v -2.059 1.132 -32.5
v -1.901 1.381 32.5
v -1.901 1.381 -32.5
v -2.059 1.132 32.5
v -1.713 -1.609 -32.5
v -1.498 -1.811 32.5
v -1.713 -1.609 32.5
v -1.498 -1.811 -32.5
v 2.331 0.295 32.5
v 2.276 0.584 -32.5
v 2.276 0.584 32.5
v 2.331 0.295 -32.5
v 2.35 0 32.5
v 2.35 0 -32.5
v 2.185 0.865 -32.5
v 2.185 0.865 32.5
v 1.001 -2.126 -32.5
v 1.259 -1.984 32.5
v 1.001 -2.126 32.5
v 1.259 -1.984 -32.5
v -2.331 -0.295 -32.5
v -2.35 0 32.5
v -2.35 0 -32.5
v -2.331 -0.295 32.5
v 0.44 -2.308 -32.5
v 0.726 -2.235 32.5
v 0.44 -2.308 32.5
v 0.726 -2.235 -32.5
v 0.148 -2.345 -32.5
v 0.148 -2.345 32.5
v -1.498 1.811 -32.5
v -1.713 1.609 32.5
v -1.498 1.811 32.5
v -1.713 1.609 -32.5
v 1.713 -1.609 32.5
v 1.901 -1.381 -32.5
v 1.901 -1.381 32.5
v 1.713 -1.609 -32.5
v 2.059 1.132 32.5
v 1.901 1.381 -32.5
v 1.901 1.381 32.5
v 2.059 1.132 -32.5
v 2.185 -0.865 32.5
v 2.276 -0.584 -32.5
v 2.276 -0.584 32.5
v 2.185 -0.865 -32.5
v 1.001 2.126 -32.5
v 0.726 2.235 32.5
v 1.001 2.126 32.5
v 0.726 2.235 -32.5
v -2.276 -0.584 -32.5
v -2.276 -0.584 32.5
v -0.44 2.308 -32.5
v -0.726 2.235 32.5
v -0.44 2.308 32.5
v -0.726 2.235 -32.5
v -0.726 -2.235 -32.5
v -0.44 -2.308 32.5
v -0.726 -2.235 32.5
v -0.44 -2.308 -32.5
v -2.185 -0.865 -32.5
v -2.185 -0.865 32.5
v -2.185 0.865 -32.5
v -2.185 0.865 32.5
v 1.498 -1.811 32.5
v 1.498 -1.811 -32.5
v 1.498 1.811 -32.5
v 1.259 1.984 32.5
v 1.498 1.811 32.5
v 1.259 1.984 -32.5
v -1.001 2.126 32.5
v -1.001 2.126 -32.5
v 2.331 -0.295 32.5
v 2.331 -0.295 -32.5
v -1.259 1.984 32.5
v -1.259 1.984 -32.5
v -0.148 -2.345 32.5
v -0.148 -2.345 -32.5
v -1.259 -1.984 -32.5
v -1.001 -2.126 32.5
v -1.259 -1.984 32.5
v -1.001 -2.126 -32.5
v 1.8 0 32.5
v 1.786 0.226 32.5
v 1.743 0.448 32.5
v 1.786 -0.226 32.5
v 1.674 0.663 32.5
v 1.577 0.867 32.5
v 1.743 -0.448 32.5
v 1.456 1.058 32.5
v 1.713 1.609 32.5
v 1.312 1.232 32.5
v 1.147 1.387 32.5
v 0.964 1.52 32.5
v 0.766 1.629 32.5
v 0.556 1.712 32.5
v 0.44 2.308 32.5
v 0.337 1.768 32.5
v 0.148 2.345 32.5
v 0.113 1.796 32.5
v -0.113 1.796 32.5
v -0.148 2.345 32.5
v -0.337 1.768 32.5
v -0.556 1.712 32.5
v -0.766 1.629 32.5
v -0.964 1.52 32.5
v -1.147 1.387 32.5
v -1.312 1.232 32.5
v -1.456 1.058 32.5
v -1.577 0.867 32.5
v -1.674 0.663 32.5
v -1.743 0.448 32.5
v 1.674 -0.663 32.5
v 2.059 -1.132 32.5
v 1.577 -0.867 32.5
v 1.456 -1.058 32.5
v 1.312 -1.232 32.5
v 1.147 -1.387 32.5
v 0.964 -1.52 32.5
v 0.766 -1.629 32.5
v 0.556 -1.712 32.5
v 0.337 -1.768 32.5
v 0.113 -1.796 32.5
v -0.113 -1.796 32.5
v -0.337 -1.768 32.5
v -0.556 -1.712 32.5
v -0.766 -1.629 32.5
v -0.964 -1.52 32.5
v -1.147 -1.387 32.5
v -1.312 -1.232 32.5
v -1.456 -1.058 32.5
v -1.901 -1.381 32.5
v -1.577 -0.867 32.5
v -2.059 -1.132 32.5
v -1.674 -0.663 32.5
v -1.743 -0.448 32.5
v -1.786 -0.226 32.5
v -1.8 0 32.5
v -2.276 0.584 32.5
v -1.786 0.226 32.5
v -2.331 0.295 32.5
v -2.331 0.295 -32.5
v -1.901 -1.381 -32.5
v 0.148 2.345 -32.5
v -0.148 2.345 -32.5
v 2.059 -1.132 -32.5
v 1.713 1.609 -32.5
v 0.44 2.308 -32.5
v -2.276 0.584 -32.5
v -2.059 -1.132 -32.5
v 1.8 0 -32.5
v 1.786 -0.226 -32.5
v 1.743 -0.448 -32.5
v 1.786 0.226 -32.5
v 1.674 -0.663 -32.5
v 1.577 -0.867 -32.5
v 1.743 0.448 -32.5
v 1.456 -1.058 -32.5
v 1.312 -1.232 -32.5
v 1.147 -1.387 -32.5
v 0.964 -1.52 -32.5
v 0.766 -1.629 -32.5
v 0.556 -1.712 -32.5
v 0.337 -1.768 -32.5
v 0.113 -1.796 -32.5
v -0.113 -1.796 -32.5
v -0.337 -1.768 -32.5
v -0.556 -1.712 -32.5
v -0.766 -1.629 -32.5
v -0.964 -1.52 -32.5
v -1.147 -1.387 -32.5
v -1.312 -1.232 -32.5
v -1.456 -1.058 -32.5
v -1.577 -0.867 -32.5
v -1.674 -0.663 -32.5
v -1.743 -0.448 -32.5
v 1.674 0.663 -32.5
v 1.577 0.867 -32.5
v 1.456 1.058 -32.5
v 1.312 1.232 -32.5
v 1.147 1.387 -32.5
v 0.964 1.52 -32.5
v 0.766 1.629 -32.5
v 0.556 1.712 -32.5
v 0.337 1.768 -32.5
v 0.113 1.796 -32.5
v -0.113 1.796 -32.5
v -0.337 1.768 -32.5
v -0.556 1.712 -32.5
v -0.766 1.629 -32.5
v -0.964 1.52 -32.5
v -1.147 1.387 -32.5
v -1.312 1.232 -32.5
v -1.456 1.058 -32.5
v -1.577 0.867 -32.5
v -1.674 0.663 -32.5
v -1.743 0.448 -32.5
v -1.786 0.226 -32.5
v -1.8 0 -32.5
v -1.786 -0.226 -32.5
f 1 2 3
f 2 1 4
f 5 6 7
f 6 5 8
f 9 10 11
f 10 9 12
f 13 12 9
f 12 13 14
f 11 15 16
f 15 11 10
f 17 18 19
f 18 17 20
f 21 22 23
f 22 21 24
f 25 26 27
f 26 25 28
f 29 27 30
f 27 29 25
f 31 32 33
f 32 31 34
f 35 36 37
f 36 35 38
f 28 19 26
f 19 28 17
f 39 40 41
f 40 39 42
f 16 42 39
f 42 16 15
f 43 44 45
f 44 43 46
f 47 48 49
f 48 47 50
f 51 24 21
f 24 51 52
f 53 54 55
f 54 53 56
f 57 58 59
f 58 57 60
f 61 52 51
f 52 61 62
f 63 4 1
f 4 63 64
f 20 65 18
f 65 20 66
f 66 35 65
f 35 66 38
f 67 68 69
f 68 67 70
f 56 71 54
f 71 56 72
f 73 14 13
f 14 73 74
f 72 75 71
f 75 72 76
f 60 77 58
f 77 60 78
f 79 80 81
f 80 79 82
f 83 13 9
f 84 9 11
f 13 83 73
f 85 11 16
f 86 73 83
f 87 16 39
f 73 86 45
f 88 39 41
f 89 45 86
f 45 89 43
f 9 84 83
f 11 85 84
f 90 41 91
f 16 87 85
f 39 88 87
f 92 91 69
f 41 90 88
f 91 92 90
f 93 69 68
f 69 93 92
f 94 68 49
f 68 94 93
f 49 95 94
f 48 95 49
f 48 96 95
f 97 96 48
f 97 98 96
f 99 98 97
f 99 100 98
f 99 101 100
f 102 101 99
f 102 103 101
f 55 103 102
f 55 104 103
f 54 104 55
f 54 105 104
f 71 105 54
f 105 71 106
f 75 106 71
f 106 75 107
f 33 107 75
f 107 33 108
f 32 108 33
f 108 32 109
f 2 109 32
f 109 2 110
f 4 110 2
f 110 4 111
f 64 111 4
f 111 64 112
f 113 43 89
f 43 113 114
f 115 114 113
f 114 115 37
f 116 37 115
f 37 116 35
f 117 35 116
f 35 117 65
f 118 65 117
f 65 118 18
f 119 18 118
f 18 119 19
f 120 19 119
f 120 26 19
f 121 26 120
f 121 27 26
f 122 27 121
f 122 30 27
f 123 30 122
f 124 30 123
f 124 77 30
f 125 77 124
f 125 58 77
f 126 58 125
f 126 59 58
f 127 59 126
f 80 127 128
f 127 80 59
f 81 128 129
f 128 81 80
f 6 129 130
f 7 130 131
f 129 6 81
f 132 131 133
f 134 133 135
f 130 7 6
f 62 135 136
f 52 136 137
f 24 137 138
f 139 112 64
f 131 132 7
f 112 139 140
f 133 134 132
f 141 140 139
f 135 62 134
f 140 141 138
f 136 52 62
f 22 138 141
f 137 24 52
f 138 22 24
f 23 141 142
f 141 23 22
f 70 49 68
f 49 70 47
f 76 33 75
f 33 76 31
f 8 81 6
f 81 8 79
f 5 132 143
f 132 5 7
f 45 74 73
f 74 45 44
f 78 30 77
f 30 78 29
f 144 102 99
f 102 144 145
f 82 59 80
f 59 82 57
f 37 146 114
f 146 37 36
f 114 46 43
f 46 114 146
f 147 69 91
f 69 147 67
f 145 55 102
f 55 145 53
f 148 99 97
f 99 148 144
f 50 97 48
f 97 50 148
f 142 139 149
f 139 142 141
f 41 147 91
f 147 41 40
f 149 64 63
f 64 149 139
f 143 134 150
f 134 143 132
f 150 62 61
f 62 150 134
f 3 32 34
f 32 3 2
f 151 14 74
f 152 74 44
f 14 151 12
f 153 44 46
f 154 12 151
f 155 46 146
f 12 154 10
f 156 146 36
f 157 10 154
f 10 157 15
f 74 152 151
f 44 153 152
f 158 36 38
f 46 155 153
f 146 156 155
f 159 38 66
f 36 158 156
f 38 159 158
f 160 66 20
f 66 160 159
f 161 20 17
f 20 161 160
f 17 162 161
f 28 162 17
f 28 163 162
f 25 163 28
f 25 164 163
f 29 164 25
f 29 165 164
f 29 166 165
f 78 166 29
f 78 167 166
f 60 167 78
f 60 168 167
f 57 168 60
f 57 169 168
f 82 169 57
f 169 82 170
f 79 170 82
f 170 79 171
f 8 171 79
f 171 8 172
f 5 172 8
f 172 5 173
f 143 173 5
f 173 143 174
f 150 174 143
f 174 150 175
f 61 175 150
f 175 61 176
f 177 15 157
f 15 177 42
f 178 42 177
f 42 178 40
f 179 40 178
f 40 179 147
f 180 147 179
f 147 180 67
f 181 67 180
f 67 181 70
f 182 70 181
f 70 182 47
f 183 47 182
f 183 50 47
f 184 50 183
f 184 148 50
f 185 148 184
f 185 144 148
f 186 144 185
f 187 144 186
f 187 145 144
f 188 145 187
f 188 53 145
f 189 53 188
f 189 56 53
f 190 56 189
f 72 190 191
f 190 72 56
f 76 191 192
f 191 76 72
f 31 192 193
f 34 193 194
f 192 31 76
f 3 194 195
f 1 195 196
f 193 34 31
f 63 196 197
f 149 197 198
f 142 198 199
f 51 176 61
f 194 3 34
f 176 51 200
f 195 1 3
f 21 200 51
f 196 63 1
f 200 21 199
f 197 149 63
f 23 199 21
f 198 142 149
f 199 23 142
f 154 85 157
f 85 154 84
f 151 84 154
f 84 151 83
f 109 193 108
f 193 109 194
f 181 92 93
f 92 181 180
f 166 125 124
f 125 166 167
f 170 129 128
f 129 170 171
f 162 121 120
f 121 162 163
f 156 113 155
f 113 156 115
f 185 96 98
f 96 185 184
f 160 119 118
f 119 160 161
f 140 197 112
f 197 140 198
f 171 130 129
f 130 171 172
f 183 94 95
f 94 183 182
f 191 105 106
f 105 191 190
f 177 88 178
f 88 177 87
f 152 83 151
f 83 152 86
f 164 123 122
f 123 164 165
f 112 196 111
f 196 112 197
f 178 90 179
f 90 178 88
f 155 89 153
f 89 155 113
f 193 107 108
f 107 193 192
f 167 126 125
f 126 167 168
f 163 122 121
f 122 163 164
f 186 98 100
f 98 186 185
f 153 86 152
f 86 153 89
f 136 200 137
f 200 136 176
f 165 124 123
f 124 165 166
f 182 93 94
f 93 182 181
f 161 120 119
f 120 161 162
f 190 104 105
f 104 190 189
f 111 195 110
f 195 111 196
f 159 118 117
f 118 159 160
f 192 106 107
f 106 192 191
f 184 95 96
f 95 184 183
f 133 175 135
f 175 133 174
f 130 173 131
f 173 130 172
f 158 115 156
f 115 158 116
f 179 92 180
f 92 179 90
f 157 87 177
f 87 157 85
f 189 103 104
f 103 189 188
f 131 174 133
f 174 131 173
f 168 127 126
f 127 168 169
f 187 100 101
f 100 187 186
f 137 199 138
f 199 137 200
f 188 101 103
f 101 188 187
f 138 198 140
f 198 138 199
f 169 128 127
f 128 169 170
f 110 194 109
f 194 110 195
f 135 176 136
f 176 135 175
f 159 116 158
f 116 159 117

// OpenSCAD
$fn = 50;


difference() {
	union() {
		translate(v = [0, 0, -32.5000000000]) {
			cylinder(h = 65, r = 2.3500000000);
		}
	}
	union() {
		#translate(v = [0, 0, -100.0000000000]) {
			cylinder(h = 200, r = 1.8000000000);
		}
	}
}
